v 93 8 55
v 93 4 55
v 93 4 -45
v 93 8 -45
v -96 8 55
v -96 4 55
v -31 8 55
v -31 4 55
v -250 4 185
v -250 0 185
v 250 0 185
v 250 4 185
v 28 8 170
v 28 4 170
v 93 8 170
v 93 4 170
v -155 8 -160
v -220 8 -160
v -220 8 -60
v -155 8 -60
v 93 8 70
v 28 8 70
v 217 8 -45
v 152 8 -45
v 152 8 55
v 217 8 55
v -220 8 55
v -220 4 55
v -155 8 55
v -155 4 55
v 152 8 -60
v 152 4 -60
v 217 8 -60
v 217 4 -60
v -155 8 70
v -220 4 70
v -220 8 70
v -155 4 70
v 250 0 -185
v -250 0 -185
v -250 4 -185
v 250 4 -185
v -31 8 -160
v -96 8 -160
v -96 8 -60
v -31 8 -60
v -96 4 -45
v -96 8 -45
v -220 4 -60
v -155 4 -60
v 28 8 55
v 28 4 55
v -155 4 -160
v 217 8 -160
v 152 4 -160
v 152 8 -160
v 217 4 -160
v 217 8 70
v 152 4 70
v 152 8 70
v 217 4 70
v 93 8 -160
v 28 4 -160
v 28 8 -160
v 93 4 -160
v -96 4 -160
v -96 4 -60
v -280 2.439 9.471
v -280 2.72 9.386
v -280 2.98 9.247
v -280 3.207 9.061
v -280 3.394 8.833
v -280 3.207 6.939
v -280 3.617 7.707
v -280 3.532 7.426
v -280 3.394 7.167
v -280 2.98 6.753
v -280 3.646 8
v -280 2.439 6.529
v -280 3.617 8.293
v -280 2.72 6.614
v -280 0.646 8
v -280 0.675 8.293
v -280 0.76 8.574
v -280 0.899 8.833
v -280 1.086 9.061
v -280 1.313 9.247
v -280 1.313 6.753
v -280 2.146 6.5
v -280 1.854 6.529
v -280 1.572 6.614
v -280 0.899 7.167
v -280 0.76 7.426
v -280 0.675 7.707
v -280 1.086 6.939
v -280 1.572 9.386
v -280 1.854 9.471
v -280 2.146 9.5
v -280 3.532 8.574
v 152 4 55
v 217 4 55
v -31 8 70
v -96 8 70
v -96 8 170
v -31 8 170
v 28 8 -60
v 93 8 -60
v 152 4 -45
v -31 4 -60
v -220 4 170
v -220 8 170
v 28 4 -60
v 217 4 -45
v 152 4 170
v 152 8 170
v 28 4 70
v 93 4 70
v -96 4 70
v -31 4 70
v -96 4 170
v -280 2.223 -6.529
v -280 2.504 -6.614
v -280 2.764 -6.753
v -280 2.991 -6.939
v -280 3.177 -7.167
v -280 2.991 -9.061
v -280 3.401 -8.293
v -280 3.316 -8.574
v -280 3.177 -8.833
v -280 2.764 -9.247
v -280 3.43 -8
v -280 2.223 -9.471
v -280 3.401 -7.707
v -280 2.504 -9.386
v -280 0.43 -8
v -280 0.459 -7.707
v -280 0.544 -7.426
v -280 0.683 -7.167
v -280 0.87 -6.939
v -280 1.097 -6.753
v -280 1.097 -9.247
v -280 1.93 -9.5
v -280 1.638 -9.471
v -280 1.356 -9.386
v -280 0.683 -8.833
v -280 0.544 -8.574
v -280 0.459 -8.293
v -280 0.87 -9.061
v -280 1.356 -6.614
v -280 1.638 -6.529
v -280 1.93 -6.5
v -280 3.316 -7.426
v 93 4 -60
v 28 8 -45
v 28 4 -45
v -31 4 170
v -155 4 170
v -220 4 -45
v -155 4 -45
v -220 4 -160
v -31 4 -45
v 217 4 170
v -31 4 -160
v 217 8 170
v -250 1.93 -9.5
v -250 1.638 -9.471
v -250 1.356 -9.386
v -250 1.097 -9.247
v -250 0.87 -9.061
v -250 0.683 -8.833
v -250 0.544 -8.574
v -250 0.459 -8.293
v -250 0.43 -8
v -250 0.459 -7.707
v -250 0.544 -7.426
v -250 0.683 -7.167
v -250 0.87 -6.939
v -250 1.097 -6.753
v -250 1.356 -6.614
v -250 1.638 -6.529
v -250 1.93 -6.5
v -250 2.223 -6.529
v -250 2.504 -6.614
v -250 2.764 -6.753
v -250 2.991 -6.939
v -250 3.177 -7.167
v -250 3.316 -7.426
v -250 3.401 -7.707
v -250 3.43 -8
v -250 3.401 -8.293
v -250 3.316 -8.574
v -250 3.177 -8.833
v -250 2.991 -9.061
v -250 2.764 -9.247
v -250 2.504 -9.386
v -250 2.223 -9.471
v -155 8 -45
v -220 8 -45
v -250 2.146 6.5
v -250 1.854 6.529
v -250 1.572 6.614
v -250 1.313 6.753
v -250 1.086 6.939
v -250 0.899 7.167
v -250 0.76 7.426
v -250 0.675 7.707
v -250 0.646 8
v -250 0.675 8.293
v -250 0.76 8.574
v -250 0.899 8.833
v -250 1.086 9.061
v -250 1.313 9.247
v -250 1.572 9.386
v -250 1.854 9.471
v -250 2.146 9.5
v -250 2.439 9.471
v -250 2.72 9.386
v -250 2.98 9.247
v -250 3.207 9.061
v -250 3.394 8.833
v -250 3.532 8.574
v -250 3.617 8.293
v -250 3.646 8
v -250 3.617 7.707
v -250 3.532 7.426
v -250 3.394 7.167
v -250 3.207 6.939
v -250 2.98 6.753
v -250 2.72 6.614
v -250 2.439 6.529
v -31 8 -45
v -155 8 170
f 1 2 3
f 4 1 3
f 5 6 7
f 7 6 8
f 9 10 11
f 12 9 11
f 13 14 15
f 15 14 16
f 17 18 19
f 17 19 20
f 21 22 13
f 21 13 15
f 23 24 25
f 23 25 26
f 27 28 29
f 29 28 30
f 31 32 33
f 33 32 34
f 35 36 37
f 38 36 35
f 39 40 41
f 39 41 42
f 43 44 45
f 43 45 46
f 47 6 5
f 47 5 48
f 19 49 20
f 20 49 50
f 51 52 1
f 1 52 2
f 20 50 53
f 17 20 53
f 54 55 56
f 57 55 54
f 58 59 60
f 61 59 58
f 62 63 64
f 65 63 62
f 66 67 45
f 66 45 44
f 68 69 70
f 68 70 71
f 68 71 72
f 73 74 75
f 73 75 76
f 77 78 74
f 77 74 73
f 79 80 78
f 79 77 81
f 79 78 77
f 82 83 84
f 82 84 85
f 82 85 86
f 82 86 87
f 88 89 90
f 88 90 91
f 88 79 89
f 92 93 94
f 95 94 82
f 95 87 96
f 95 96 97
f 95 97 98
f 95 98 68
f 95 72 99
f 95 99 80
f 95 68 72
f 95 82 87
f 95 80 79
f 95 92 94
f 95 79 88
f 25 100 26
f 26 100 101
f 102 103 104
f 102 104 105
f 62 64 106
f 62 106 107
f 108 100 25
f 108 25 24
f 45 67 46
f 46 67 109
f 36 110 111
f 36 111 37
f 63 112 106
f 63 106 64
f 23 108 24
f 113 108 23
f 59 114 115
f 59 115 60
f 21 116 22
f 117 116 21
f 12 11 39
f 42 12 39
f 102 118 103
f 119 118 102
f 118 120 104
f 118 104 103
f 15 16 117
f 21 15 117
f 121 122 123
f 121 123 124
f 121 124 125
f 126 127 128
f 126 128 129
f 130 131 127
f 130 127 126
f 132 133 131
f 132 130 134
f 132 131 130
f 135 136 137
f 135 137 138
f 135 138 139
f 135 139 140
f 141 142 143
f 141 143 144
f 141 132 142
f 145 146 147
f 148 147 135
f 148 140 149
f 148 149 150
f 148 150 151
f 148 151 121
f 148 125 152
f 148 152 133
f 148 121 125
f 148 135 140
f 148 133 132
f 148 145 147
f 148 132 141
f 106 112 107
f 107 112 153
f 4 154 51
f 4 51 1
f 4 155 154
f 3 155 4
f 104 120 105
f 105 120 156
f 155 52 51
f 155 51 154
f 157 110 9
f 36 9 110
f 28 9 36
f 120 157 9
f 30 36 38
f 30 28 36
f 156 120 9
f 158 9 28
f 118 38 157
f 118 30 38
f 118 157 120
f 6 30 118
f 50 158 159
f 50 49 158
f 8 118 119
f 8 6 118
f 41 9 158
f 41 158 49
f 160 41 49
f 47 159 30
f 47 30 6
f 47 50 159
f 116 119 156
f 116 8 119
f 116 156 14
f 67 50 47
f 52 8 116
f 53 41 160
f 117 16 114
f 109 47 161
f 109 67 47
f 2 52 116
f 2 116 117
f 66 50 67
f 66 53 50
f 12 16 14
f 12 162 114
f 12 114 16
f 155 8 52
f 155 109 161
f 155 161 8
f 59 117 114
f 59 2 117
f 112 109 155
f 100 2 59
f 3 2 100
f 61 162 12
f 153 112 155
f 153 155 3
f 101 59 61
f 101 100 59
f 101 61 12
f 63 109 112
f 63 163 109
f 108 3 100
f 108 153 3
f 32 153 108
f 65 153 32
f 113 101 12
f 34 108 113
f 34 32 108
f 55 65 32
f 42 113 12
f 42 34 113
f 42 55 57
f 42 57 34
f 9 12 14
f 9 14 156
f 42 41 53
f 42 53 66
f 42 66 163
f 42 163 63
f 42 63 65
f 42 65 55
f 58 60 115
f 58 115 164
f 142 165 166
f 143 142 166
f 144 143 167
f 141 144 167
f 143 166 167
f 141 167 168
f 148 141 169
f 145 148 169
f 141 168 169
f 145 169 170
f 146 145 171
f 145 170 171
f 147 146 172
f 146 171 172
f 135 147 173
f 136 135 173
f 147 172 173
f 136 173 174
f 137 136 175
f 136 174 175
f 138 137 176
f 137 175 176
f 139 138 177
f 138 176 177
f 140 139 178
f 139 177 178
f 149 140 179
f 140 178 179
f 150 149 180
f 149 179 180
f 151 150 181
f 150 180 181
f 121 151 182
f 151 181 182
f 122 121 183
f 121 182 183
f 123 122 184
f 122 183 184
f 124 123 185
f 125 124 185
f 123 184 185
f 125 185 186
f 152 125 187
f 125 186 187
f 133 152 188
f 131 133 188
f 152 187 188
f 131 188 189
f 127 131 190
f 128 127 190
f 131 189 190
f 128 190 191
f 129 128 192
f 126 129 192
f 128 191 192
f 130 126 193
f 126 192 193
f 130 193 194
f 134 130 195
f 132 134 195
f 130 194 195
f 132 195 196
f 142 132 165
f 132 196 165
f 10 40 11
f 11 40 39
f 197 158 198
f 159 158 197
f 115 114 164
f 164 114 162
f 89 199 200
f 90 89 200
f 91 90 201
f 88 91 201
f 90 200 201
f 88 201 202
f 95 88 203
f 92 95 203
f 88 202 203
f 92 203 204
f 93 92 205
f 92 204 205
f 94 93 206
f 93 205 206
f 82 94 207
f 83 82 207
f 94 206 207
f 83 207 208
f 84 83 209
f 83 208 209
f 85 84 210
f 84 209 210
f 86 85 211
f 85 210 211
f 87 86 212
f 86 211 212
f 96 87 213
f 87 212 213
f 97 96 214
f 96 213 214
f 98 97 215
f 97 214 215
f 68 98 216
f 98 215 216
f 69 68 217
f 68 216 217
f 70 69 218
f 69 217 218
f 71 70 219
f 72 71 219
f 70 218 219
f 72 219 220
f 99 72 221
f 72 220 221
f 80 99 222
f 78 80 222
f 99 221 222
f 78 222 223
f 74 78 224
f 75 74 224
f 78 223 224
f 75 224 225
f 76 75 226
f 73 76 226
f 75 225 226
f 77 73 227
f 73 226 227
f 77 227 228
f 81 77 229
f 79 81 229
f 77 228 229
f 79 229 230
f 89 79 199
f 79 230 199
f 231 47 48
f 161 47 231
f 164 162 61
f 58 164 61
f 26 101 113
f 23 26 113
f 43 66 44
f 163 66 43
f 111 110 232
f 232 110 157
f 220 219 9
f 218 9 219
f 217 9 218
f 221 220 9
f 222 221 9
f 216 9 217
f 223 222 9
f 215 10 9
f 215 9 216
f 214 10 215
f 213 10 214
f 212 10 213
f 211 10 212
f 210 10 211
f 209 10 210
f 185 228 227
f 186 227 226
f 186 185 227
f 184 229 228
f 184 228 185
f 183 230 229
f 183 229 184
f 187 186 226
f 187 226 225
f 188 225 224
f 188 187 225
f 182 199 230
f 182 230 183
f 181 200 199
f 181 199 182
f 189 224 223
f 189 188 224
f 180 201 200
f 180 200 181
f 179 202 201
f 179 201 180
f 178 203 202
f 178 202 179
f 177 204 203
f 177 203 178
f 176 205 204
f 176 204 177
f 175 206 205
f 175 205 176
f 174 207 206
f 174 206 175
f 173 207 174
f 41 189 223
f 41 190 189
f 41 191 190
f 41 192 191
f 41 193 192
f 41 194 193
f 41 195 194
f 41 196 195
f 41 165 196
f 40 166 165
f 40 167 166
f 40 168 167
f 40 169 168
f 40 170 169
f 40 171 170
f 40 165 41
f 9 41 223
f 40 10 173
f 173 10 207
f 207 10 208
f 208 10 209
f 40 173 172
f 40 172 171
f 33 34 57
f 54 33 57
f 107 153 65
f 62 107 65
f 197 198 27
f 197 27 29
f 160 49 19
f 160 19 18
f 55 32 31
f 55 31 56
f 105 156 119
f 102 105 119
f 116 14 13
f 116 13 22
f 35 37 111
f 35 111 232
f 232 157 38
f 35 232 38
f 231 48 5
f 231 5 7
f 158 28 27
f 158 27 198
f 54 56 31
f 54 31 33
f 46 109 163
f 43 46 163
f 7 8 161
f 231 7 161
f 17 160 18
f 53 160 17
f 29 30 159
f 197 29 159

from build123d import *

# Parameters (mm, degrees)
SKETCH1_W            = 500
SKETCH1_H            = 370
PANEL_BASE_DEPTH     = 4
SKETCH2_W            = 65
SKETCH2_H            = 100
SOLAR_ARRAY_DEPTH    = 4
LPATTERN1_COUNT      = 4
LPATTERN1_PITCH      = 124
LPATTERN1_COUNT_DIR2 = 3
LPATTERN1_PITCH_DIR2 = 115
SKETCH3_R            = 1.5
POSITIVE_WIRE_DEPTH  = 30
SKETCH4_R            = 1.5
NEGATIVE_WIRE_DEPTH  = 30


with BuildPart() as part:
    # Sketch1 → panel_base (new body)
    with BuildSketch(Plane(origin=(0, 0, 0), x_dir=(1, 0, 0), z_dir=(0, 1, 0))):
        Rectangle(SKETCH1_W, SKETCH1_H)
    extrude(amount=PANEL_BASE_DEPTH)

    # Sketch2 → solar_array (add)
    with BuildSketch(Plane(origin=(0, 4, 0), x_dir=(1, 0, 0), z_dir=(0, 1, 0))):
        with Locations((-187.5, 110)):
            Rectangle(SKETCH2_W, SKETCH2_H)
    solar_array = extrude(amount=SOLAR_ARRAY_DEPTH)

    # LPattern1: solar_array 4 × 3
    with Locations(*[(i * LPATTERN1_PITCH, 0, j * LPATTERN1_PITCH_DIR2) for i in range(LPATTERN1_COUNT) for j in range(LPATTERN1_COUNT_DIR2) if (i, j) != (0, 0)]):
        add(solar_array)

    # Sketch3 → positive_wire (add)
    with BuildSketch(Plane.ZY.offset(250)):
        with Locations(Location((-8, 1.930294272, 0), (0, 0, 180))):
            Circle(SKETCH3_R)
    extrude(amount=POSITIVE_WIRE_DEPTH)

    # Sketch4 → negative_wire (add)
    with BuildSketch(Plane.ZY.offset(250)):
        with Locations(Location((8, 2.146306887, 0), (0, 0, 180))):
            Circle(SKETCH4_R)
    extrude(amount=NEGATIVE_WIRE_DEPTH)


solid = part.part
